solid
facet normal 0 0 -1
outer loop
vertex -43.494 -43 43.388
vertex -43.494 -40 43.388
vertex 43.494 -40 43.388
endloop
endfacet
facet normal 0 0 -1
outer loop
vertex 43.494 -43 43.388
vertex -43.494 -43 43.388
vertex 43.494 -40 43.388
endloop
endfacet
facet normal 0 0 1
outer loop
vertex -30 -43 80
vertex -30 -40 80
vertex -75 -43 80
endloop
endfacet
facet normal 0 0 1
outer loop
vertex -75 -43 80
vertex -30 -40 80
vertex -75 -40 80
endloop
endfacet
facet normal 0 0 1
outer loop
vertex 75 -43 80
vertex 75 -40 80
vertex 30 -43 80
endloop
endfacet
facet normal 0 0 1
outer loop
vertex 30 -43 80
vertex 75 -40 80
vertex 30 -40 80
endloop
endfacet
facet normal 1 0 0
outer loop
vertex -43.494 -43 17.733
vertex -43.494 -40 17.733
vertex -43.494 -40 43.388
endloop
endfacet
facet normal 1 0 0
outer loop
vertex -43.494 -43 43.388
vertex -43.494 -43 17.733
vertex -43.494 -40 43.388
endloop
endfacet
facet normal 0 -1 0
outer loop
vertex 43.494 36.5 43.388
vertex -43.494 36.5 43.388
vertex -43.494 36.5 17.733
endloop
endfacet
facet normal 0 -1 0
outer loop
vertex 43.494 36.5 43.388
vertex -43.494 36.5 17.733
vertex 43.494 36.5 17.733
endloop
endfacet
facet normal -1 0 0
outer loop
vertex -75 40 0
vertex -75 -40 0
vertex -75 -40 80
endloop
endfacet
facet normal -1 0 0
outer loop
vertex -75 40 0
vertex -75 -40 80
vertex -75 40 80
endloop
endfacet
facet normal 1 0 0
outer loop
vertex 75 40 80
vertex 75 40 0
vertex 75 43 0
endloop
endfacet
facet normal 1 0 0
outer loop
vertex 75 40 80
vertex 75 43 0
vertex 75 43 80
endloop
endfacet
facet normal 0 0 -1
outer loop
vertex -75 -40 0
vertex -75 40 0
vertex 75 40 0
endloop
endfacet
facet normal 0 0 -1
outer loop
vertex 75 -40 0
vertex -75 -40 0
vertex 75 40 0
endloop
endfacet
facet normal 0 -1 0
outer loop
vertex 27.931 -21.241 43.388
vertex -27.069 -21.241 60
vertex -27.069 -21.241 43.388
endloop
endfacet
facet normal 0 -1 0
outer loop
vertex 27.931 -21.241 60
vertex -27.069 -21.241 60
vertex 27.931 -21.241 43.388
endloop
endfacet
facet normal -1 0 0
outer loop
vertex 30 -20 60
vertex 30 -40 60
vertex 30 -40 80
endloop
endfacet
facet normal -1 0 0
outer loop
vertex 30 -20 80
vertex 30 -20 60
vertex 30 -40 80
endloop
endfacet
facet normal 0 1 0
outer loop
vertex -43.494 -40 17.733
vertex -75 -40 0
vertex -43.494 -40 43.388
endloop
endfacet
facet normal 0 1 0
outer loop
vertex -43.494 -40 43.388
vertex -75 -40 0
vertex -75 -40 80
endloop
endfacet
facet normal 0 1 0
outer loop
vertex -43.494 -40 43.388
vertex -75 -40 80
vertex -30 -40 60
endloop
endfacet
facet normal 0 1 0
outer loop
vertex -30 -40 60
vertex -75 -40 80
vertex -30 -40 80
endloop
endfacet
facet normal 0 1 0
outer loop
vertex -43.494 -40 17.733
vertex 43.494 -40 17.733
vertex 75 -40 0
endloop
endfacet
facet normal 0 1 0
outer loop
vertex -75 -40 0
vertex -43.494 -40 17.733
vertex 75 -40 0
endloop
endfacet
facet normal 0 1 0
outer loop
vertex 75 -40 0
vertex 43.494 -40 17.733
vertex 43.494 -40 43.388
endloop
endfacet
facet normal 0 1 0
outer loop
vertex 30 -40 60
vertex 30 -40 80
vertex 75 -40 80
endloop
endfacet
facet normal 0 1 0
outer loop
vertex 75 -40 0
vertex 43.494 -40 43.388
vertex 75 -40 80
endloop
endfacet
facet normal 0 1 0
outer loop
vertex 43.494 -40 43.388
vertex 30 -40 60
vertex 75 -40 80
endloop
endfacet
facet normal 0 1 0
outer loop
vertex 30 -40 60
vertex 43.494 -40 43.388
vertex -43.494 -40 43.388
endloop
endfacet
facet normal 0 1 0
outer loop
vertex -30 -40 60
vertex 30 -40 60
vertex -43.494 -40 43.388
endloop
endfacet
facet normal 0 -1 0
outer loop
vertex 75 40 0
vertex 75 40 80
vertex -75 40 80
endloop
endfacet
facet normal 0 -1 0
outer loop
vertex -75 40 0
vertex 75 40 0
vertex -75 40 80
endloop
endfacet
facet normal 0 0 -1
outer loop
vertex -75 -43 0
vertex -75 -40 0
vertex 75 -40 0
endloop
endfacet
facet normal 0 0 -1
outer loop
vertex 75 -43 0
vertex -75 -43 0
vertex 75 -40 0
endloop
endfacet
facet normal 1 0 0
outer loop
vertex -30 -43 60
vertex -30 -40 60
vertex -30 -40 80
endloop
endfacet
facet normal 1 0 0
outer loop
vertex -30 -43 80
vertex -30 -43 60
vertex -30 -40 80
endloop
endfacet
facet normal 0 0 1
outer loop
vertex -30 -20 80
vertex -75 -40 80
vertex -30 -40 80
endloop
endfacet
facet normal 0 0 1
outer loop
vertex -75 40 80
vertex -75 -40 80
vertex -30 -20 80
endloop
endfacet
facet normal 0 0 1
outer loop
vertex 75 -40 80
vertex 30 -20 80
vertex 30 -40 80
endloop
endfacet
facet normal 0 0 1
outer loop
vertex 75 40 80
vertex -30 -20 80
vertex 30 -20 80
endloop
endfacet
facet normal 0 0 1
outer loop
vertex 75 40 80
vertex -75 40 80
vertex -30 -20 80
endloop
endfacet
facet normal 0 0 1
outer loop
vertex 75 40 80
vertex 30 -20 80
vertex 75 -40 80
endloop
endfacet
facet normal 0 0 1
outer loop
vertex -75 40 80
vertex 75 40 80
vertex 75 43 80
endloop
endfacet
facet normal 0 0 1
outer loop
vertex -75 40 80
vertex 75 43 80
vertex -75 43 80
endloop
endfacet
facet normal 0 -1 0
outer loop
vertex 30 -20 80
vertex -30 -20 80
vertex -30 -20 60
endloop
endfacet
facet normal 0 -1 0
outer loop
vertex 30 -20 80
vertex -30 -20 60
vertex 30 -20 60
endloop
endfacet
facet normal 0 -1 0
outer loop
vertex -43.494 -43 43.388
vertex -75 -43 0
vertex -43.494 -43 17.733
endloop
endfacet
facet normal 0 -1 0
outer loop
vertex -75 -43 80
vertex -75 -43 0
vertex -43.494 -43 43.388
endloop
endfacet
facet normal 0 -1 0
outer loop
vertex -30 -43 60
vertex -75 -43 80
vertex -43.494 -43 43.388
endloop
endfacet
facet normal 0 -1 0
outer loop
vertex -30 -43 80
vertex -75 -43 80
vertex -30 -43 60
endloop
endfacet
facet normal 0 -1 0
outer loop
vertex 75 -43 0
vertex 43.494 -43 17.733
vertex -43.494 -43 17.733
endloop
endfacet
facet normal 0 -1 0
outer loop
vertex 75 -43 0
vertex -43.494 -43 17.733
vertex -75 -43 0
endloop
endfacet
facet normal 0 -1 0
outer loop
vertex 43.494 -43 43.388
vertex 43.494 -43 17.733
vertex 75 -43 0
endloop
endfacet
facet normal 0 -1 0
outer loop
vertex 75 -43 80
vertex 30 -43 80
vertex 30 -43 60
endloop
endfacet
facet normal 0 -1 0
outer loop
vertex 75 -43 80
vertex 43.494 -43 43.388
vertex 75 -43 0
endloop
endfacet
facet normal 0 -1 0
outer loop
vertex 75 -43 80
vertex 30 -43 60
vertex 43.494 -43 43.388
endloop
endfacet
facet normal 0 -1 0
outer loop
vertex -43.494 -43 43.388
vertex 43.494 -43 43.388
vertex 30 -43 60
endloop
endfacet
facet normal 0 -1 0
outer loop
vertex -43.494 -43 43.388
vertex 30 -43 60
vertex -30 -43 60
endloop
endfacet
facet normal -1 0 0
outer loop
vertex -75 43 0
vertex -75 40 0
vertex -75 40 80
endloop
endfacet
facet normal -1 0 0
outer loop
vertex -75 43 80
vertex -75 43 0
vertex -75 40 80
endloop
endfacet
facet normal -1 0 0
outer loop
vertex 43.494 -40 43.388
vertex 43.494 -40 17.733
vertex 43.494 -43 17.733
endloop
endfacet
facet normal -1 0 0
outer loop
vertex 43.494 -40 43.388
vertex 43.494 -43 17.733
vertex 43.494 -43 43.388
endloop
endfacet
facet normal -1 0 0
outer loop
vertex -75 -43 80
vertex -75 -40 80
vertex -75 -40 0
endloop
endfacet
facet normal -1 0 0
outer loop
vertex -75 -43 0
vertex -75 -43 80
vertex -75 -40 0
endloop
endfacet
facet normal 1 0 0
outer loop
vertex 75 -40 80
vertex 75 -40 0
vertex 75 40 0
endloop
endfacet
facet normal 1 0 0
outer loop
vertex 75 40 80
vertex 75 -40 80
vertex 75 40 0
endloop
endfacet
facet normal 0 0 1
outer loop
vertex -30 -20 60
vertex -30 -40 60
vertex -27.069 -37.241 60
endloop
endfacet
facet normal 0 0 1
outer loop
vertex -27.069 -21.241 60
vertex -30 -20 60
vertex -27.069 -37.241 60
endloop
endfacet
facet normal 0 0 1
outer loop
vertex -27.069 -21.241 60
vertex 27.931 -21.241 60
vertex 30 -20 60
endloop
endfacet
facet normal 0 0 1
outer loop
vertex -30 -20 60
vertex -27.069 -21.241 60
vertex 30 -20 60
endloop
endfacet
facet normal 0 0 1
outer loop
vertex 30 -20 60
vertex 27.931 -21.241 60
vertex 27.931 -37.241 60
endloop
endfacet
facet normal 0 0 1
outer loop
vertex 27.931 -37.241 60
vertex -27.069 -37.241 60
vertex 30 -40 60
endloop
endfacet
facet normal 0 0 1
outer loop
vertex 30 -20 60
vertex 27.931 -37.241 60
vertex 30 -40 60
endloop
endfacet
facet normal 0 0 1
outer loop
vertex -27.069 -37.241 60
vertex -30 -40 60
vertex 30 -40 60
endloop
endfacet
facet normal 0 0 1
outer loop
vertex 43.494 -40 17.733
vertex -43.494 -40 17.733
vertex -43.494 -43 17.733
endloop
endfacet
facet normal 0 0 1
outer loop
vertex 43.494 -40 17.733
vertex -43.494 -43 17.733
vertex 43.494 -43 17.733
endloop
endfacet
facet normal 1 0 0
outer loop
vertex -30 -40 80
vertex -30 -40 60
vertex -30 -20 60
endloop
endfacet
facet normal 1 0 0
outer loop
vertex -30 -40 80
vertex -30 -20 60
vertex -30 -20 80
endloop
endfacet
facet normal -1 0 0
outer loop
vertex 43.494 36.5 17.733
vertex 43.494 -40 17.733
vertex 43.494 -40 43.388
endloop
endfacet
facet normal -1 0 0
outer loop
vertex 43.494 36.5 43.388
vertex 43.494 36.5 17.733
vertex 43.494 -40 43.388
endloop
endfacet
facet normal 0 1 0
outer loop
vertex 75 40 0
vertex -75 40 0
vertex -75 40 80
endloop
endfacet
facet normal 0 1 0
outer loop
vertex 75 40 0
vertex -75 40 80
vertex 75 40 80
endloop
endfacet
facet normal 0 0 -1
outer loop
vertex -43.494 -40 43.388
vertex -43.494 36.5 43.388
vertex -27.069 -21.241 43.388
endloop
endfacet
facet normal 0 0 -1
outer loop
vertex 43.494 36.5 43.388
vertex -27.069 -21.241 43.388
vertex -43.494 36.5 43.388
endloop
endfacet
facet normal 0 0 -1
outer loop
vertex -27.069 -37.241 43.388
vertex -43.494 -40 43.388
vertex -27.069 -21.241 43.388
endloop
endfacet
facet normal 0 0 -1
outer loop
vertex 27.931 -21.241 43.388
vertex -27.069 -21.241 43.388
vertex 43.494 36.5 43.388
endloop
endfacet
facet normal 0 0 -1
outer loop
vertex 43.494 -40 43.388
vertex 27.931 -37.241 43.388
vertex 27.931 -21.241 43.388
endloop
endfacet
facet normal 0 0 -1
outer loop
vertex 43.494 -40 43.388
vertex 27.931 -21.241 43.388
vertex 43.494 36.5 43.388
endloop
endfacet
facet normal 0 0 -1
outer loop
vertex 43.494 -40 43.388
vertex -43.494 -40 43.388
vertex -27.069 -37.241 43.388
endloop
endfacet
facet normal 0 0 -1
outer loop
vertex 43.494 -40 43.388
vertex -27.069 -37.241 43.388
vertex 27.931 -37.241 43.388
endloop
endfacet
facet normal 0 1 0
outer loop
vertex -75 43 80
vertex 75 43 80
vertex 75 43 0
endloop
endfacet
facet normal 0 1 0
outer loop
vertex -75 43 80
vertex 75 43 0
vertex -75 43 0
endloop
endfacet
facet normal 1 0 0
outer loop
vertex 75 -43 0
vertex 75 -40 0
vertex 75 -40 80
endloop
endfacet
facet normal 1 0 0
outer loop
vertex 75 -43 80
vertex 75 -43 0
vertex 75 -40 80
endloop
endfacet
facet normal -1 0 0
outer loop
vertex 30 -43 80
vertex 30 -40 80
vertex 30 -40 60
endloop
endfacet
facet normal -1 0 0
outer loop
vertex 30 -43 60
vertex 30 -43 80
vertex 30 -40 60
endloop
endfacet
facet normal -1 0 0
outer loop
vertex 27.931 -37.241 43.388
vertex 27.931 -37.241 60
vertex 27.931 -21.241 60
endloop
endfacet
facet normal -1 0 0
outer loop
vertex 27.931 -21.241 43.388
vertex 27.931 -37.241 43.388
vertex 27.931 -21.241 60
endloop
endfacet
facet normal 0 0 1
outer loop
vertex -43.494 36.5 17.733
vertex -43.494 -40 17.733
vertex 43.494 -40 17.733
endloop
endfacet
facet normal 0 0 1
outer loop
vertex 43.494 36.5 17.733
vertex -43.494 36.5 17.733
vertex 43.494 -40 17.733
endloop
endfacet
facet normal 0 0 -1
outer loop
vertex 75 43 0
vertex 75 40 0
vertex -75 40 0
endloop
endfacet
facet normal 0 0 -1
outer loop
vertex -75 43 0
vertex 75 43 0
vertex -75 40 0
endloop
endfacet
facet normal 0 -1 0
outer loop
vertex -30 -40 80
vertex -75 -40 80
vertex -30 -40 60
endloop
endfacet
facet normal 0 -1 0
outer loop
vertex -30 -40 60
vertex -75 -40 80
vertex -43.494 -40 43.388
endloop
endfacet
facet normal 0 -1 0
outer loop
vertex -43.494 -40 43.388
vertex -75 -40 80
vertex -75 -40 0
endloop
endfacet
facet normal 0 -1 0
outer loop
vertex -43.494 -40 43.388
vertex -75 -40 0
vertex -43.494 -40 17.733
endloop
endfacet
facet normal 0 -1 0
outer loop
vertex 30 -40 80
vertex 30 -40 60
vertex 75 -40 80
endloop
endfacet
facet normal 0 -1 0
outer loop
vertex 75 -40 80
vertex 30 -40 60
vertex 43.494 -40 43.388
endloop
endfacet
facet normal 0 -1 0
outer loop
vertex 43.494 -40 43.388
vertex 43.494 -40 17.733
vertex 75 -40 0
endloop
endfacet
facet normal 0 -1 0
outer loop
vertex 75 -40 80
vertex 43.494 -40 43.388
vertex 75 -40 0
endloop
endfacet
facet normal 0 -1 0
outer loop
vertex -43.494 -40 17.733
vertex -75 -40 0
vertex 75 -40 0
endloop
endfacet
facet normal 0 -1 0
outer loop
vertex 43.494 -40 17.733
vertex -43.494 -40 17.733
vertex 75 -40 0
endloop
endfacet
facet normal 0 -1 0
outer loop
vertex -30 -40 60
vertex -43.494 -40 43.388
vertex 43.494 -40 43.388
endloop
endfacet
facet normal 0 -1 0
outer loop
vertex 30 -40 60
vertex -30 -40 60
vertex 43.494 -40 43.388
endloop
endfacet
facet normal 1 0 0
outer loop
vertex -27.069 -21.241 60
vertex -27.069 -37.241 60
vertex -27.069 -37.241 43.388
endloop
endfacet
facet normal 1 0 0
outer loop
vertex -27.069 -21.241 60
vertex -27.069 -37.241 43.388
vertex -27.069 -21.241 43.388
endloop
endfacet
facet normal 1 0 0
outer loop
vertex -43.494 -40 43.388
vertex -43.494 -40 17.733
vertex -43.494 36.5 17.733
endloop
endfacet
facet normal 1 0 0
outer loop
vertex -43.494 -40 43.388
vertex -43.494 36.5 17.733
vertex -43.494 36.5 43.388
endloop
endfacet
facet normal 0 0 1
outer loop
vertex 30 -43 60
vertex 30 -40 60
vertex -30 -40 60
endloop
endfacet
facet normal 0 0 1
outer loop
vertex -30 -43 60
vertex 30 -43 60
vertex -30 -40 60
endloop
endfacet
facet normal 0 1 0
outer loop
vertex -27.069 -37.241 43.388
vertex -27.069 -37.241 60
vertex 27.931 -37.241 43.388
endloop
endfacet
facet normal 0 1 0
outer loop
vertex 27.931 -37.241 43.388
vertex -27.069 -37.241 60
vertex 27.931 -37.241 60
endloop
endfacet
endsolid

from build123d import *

# Parameters (mm, degrees)
F0_W      = 150
F0_H      = 80
F1_DEPTH  = 80
F2_W      = 30
F2_H      = 20
F3_DEPTH  = 20
F4_W      = 55
F4_H      = 16
F5_DEPTH  = 26.8
F6_W      = 86.9870632887
F6_H      = 25.6551727653
F7_DEPTH  = 76.5
F8_W      = 86.9870632887
F8_H      = 25.6551727653
F9_DEPTH  = 3
F10_W     = 150
F10_H     = 80
F11_DEPTH = 3


with BuildPart() as f1:
    # F0 (on Top) → F1 (new body)
    with BuildSketch(Plane.XY):
        Rectangle(F0_W, F0_H)
    extrude(amount=F1_DEPTH)

    # F2 (on face) → F3 (cut)
    with BuildSketch(Plane.XZ.offset(40)):
        with Locations((15, 70)):
            Rectangle(F2_W, F2_H)
        with Locations((-15, 70)):
            Rectangle(F2_W, F2_H)
    extrude(amount=-F3_DEPTH, mode=Mode.SUBTRACT)

    # F4 (on face) → F5 (cut)
    with BuildSketch(Plane.XY.offset(60)):
        with Locations((0.431034565, -29.2413806617)):
            Rectangle(F4_W, F4_H)
    extrude(amount=-F5_DEPTH, mode=Mode.SUBTRACT)

    # F6 (on face) → F7 (cut)
    with BuildSketch(Plane.XZ.offset(40)):
        with Locations((0, 30.560342595)):
            Rectangle(F6_W, F6_H)
    extrude(amount=-F7_DEPTH, mode=Mode.SUBTRACT)


with BuildPart() as f9:
    # F8 (on face) → F9 (new body)
    with BuildSketch(Plane.XZ.offset(40)):
        Polygon((75, 0), (75, 80), (30, 80), (30, 60), (-30, 60), (-30, 80), (-75, 80), (-75, 0), align=None)
        with Locations((0, 30.560342595)):
            Rectangle(F8_W, F8_H, mode=Mode.SUBTRACT)
    extrude(amount=F9_DEPTH)


with BuildPart() as f11:
    # F10 (on face) → F11 (new body)
    with BuildSketch(Plane(origin=(0, 40, 0), x_dir=(-1, 0, 0), z_dir=(0, 1, 0))):
        with Locations((0, 40)):
            Rectangle(F10_W, F10_H)
    extrude(amount=F11_DEPTH)


solid = Compound([f1.part, f9.part, f11.part])
